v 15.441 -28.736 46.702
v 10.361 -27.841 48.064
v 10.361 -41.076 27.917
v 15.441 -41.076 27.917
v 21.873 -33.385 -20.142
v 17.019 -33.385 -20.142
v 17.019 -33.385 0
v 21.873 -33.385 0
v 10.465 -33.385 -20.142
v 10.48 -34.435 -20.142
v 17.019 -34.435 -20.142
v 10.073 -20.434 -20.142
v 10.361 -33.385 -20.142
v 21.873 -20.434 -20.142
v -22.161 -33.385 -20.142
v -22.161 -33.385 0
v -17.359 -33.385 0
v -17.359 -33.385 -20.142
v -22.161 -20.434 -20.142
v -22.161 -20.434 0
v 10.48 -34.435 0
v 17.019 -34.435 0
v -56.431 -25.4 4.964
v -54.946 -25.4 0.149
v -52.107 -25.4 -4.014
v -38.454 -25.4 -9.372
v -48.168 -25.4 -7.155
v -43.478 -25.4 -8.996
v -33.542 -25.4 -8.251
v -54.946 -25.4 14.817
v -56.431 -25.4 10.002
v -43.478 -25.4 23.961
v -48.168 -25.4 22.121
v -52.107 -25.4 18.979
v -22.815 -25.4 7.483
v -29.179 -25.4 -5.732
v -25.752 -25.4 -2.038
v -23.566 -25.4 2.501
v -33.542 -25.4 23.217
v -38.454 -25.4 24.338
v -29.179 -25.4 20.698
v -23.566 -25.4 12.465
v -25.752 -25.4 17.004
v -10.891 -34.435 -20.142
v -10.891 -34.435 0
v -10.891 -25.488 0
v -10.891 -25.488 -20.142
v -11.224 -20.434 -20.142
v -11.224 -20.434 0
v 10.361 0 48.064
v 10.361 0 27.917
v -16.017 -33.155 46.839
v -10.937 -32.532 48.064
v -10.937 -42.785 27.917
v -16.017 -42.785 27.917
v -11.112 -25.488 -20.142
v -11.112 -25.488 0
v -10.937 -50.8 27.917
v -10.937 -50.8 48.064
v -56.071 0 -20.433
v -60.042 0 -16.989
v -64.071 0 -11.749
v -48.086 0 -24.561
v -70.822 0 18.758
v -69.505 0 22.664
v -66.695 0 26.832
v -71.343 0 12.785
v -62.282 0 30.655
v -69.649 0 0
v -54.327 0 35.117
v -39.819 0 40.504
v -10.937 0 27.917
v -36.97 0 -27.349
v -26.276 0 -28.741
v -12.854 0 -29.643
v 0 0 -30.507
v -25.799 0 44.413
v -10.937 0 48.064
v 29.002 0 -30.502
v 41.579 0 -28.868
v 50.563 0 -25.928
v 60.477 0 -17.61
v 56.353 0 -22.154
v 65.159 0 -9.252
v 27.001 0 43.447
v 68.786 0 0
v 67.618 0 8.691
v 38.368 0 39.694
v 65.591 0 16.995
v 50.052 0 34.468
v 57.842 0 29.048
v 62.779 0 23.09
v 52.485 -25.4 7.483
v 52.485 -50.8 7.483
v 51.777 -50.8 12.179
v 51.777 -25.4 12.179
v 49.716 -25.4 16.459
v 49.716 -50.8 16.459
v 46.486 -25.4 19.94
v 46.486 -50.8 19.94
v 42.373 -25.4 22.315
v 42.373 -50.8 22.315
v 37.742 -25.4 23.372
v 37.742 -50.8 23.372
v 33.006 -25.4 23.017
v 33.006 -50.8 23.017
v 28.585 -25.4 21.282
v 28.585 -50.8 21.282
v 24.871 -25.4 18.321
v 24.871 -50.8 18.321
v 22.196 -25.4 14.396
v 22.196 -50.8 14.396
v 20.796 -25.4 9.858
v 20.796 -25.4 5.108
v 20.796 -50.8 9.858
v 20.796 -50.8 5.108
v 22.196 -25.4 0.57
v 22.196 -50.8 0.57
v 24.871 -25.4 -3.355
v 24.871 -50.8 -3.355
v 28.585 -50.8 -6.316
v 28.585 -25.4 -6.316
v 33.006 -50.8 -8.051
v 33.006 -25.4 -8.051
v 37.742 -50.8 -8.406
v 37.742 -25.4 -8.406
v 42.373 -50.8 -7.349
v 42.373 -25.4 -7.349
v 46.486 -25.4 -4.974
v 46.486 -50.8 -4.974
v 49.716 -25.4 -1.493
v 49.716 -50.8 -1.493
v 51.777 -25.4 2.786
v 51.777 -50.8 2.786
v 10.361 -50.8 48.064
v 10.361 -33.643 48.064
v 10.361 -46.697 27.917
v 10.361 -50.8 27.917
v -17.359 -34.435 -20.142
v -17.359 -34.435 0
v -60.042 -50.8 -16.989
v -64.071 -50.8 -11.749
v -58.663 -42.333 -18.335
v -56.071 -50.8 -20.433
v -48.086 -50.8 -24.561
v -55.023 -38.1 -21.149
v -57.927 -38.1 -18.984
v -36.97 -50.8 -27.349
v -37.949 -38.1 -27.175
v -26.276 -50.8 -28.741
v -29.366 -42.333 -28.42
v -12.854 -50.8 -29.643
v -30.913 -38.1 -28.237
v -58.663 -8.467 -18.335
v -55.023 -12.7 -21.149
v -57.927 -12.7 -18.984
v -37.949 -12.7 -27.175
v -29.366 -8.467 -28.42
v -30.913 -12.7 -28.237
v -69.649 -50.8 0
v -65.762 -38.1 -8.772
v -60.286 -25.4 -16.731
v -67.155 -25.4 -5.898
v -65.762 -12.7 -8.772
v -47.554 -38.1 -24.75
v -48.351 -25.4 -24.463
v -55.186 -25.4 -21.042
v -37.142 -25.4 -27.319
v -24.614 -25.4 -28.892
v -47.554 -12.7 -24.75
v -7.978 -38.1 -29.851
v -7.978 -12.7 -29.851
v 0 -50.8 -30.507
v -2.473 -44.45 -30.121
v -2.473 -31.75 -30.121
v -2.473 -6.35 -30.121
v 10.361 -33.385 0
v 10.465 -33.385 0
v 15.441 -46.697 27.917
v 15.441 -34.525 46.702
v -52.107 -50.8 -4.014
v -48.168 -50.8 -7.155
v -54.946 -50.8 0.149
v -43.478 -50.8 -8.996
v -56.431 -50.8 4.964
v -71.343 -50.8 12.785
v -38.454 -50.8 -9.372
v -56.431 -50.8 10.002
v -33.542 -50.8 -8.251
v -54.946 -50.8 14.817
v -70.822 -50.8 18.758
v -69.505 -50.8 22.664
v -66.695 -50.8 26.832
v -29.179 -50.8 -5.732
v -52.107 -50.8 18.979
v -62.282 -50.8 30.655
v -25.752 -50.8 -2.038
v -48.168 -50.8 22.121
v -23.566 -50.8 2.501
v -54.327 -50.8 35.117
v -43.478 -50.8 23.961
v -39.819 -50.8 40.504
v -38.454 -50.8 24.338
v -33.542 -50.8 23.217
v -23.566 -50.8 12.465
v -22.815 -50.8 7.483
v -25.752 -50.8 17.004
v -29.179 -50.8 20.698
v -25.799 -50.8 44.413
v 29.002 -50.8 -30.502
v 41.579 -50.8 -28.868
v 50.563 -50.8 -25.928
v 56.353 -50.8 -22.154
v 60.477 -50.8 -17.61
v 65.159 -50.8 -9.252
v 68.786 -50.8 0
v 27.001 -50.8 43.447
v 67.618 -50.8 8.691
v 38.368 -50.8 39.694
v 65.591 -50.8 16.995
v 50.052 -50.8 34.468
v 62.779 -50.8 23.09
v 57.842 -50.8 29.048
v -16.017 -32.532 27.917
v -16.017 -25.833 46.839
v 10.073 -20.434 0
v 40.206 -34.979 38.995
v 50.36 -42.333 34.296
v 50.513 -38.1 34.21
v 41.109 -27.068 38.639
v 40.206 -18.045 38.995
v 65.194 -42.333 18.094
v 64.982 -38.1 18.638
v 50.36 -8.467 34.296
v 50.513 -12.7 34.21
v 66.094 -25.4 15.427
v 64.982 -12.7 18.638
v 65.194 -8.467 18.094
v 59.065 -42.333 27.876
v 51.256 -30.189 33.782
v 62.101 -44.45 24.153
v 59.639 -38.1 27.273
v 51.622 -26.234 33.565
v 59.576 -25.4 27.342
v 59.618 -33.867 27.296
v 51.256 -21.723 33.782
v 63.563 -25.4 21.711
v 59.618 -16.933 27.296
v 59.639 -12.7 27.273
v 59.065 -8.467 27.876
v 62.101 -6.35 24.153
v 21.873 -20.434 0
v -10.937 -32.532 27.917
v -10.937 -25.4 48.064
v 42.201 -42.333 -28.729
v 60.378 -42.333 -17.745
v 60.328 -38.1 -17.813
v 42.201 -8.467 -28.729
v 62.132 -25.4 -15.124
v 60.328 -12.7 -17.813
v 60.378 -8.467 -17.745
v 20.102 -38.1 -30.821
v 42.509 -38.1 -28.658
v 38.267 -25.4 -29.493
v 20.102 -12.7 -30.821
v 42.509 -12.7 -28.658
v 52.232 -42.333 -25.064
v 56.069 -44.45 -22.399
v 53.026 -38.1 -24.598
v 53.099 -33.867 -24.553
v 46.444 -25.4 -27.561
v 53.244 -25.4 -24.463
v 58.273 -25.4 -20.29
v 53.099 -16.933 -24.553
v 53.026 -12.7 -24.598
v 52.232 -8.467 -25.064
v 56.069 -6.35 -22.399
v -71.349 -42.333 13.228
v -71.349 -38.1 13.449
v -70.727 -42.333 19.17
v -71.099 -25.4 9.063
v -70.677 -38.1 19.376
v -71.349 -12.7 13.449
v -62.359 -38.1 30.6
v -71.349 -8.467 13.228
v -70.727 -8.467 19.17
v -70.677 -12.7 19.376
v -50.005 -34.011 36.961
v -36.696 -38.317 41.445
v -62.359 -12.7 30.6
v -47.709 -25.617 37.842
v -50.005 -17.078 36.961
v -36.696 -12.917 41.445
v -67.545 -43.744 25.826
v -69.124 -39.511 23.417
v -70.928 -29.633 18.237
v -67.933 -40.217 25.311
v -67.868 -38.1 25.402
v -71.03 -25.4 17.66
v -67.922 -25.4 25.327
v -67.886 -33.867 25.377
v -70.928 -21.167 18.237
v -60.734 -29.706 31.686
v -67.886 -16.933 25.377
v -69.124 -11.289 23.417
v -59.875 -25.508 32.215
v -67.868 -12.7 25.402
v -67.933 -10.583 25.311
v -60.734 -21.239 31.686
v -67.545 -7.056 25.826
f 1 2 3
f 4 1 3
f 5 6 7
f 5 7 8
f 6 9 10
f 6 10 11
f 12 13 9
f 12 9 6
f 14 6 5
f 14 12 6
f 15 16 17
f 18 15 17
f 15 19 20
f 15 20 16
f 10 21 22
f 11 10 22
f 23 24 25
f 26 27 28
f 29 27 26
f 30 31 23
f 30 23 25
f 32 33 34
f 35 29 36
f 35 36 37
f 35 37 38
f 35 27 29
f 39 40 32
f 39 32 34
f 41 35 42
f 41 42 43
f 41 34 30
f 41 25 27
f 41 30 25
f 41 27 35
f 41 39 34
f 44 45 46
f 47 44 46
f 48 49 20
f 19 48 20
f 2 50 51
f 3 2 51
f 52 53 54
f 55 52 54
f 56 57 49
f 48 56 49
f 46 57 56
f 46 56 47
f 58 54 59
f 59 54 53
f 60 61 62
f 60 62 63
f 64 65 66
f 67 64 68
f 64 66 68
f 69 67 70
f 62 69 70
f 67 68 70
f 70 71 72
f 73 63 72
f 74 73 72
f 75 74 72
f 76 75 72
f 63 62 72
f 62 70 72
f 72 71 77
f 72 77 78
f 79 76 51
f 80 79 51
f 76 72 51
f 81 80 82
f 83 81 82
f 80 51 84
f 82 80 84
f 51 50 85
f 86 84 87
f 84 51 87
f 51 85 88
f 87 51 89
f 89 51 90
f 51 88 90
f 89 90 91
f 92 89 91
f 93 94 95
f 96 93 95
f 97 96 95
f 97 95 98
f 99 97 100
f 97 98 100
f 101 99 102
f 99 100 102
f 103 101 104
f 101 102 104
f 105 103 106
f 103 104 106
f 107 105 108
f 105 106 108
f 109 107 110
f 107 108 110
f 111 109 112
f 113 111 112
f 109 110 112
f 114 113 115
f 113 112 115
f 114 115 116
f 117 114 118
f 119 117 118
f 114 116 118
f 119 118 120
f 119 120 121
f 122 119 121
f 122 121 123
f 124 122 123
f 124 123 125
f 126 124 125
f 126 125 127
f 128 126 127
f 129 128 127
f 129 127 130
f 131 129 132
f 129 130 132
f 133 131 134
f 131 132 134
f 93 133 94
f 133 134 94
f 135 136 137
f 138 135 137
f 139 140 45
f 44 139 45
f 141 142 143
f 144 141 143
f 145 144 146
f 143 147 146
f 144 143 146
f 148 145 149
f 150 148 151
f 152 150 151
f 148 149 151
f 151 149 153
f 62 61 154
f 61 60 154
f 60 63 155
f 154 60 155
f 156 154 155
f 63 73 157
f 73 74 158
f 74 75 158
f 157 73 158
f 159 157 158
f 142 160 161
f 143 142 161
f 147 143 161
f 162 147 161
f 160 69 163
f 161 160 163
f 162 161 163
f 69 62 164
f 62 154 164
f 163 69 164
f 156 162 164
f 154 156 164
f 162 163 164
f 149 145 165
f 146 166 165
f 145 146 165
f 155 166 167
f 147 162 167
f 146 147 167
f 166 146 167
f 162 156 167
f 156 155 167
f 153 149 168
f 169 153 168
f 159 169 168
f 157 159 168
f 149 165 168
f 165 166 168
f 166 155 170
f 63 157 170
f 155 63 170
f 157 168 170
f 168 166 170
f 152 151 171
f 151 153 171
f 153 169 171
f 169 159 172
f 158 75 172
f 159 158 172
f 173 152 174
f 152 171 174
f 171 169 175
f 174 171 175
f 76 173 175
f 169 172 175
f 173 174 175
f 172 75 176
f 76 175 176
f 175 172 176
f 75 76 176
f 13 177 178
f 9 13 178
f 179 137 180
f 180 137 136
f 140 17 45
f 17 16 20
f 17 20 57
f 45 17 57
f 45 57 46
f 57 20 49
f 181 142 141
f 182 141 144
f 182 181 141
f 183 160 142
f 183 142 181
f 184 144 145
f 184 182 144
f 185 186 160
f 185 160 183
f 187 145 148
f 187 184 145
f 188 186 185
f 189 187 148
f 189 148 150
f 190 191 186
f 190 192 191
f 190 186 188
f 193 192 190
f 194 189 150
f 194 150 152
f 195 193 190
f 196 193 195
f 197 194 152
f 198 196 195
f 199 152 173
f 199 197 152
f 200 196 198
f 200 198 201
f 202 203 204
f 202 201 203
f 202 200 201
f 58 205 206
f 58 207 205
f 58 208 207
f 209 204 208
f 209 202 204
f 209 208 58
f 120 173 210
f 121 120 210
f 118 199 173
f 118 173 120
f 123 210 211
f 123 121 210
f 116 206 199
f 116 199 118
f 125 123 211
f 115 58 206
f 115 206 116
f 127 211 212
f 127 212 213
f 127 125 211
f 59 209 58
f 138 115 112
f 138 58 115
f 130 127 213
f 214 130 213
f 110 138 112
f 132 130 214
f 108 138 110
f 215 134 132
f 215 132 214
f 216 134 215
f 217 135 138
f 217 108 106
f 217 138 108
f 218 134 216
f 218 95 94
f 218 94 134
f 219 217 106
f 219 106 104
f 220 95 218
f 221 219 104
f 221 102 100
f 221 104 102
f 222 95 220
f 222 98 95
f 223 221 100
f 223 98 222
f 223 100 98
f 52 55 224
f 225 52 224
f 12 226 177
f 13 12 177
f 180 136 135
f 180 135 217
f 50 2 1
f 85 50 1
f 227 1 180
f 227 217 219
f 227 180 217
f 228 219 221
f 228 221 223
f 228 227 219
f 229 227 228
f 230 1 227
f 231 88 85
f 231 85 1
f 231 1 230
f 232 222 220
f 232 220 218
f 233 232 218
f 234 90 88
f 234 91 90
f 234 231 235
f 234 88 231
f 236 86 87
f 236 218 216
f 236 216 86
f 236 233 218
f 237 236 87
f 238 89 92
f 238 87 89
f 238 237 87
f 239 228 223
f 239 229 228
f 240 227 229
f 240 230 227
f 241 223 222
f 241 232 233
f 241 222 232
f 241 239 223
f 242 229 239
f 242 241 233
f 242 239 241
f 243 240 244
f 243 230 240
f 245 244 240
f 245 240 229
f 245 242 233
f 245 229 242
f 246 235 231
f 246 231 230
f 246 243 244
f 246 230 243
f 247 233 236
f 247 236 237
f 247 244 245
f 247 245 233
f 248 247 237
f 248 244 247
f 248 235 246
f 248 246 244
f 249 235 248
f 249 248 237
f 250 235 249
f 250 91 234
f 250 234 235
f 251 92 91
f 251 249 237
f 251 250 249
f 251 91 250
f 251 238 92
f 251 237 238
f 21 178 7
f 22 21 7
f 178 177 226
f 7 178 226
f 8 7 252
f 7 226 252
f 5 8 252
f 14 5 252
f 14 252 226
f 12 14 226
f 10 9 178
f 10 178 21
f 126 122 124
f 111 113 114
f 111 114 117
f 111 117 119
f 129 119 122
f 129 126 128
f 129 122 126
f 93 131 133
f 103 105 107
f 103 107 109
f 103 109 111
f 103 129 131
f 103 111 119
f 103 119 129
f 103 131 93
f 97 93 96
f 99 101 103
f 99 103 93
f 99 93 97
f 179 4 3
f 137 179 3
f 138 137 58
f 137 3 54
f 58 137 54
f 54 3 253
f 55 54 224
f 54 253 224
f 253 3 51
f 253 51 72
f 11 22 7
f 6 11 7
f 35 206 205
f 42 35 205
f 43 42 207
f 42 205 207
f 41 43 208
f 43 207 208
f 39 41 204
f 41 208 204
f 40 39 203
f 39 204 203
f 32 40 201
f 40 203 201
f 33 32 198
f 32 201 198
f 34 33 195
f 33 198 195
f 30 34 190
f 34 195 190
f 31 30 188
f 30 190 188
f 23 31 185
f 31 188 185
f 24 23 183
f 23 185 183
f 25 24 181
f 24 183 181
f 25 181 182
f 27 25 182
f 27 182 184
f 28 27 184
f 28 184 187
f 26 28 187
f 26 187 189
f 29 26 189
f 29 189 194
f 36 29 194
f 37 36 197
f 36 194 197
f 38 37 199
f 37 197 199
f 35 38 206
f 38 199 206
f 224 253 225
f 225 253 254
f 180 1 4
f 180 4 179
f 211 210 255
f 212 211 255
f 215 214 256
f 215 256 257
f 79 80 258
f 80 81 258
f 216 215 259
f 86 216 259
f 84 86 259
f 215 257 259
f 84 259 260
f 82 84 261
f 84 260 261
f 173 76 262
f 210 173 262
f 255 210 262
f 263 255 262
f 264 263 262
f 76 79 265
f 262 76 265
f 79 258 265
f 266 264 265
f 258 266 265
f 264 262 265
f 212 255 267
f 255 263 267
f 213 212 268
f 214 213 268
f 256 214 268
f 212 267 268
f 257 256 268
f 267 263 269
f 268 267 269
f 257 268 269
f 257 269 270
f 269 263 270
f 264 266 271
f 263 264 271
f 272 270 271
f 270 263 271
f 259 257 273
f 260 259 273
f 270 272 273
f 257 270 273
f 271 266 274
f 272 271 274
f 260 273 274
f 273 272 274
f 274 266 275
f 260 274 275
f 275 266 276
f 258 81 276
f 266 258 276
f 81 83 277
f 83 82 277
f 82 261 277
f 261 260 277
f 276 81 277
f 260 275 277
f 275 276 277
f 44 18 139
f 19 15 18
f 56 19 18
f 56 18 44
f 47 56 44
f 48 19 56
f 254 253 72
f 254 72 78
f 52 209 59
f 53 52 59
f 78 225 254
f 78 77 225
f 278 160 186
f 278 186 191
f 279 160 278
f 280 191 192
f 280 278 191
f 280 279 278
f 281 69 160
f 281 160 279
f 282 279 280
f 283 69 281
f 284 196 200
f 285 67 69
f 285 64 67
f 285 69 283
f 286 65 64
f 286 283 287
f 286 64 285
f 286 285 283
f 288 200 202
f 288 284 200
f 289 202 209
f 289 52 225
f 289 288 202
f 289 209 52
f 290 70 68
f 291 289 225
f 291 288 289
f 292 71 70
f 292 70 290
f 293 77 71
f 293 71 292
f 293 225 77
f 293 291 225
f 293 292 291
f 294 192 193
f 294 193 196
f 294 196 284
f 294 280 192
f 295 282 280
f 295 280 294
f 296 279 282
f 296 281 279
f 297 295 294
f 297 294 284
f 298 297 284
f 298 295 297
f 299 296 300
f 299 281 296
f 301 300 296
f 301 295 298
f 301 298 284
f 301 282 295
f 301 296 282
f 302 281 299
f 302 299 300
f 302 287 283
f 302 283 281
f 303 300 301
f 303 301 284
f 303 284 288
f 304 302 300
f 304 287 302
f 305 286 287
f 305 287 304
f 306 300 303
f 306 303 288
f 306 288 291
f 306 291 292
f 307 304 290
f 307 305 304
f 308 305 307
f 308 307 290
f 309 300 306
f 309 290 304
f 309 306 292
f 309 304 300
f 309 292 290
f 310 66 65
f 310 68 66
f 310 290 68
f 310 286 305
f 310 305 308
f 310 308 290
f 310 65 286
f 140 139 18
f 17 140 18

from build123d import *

# Parameters (mm, degrees)
F1_DEPTH  = 50.8
F2_R      = 16.9023108292
F2_R_2    = 15.9336293425
F3_DEPTH  = 25.4
F4_W      = 6.4683202654
F4_H      = 8.9478455484
F5_DEPTH  = 20.1422
F7_DEPTH  = 20.1422
F9_DEPTH  = 5.08
F11_DEPTH = 5.08
F13_DEPTH = 5.08


with BuildPart() as f1:
    # F0 (on Front) → F1 (new body)
    with BuildSketch(Plane.XZ):
        with BuildLine():
            Line((10.3610064834, 27.9171578586), (-10.9366187826, 27.9171578586))
            Line((-10.9366187826, 27.9171578586), (-10.9366187826, 48.0635650456))
            add(Edge.make_bspline(
                [(-69.6489959955, 0), (-71.3521609697, 9.1404972773), (-75.7031147589, 32.4910721582), (-35.4393063841, 42.172124994), (-10.9366187826, 48.0635650456)],
                knots=[0, 0, 0, 0, 0.3914463487, 1, 1, 1, 1], degree=3))
            add(Edge.make_bspline(
                [(-69.6489959955, 0), (-65.6808981625, -9.7567834982), (-56.8491666777, -31.4722995051), (-1.4859571576, -29.3762186894), (0, -30.5074099451)],
                knots=[0, 0, 0, 0, 0.4310565027, 0.9593955207, 0.9593955207, 0.9593955207, 0.9593955207], degree=3))
            add(Edge.make_bspline(
                [(0, -30.5074099451), (20.8319398692, -31.1069128662), (56.9844176124, -32.1473112232), (65.2730555247, -9.5683941039), (68.7855780125, 0)],
                knots=[0, 0, 0, 0, 0.576224402, 1, 1, 1, 1], degree=3))
            add(Edge.make_bspline(
                [(10.3610064834, 48.0635650456), (30.289884659, 42.7388235814), (64.8673270211, 33.5001730438), (67.6195937052, 9.968906062), (68.7855780125, 0)],
                knots=[0, 0, 0, 0, 0.5763548954, 1, 1, 1, 1], degree=3))
            Line((10.3610064834, 48.0635650456), (10.3610064834, 27.9171578586))
        make_face()
    extrude(amount=F1_DEPTH)

    # F2 (on face) → F3 (cut)
    with BuildSketch(Plane.XZ.offset(50.8)):
        with Locations((-39.7171936929, 7.4829496443)):
            Circle(F2_R)
        with Locations((36.5513339639, 7.4829496443)):
            Circle(F2_R_2)
    extrude(amount=-F3_DEPTH, mode=Mode.SUBTRACT)

    # F4 (on Top) → F5 (cut)
    with BuildSketch(Plane.XY):
        with Locations((-14.1248302534, -29.9614351243)):
            Rectangle(F4_W, F4_H)
        Polygon((17.0188006014, -25.4875123501), (10.3522520512, -25.4875123501), (10.4804551229, -34.4353578985), (17.0188006014, -34.4353578985), align=None)
    extrude(amount=-F5_DEPTH, mode=Mode.SUBTRACT)

    # F6 (on Top) → F7 (cut)
    with BuildSketch(Plane.XY):
        Polygon((-10.9366187826, -33.3854667842), (-11.2244244665, -20.4342082143), (-22.1610441804, -20.4342082143), (-22.1610441804, -33.3854667842), align=None)
        Polygon((21.8732375652, -20.4342082143), (10.0732007995, -20.4342082143), (10.3610064834, -33.3854667842), (21.8732375652, -33.3854667842), align=None)
    extrude(amount=-F7_DEPTH, mode=Mode.SUBTRACT)

    # F8 (on face) → F9 (cut)
    with BuildSketch(Plane.YZ.offset(-10.9366187826)):
        Polygon((-32.5317271054, 27.9171578586), (-25.4, 48.0635650456), (-32.5317271054, 48.0635650456), (-42.7853837609, 27.9171578586), align=None)
    extrude(amount=-F9_DEPTH, mode=Mode.SUBTRACT)

    # F10 (on Front) → F11 (cut)
    with BuildSketch(Plane.XZ):
        Polygon((29.1642211378, 44.9136085808), (20.9452454001, 46.1828112602), (29.1642211378, 24.8657949269), (35.5472825468, 23.4038140625), align=None)
    extrude(amount=-F11_DEPTH, mode=Mode.SUBTRACT)

    # F12 (on face) → F13 (cut)
    with BuildSketch(Plane(origin=(10.3610064834, 0, 0), x_dir=(0, -1, 0), z_dir=(-1, 0, 0))):
        Polygon((33.6429066956, 48.0635650456), (27.8411041945, 48.0635650456), (41.0764664412, 27.9171578586), (46.6969534755, 27.9171578586), align=None)
    extrude(amount=-F13_DEPTH, mode=Mode.SUBTRACT)


solid = f1.part
